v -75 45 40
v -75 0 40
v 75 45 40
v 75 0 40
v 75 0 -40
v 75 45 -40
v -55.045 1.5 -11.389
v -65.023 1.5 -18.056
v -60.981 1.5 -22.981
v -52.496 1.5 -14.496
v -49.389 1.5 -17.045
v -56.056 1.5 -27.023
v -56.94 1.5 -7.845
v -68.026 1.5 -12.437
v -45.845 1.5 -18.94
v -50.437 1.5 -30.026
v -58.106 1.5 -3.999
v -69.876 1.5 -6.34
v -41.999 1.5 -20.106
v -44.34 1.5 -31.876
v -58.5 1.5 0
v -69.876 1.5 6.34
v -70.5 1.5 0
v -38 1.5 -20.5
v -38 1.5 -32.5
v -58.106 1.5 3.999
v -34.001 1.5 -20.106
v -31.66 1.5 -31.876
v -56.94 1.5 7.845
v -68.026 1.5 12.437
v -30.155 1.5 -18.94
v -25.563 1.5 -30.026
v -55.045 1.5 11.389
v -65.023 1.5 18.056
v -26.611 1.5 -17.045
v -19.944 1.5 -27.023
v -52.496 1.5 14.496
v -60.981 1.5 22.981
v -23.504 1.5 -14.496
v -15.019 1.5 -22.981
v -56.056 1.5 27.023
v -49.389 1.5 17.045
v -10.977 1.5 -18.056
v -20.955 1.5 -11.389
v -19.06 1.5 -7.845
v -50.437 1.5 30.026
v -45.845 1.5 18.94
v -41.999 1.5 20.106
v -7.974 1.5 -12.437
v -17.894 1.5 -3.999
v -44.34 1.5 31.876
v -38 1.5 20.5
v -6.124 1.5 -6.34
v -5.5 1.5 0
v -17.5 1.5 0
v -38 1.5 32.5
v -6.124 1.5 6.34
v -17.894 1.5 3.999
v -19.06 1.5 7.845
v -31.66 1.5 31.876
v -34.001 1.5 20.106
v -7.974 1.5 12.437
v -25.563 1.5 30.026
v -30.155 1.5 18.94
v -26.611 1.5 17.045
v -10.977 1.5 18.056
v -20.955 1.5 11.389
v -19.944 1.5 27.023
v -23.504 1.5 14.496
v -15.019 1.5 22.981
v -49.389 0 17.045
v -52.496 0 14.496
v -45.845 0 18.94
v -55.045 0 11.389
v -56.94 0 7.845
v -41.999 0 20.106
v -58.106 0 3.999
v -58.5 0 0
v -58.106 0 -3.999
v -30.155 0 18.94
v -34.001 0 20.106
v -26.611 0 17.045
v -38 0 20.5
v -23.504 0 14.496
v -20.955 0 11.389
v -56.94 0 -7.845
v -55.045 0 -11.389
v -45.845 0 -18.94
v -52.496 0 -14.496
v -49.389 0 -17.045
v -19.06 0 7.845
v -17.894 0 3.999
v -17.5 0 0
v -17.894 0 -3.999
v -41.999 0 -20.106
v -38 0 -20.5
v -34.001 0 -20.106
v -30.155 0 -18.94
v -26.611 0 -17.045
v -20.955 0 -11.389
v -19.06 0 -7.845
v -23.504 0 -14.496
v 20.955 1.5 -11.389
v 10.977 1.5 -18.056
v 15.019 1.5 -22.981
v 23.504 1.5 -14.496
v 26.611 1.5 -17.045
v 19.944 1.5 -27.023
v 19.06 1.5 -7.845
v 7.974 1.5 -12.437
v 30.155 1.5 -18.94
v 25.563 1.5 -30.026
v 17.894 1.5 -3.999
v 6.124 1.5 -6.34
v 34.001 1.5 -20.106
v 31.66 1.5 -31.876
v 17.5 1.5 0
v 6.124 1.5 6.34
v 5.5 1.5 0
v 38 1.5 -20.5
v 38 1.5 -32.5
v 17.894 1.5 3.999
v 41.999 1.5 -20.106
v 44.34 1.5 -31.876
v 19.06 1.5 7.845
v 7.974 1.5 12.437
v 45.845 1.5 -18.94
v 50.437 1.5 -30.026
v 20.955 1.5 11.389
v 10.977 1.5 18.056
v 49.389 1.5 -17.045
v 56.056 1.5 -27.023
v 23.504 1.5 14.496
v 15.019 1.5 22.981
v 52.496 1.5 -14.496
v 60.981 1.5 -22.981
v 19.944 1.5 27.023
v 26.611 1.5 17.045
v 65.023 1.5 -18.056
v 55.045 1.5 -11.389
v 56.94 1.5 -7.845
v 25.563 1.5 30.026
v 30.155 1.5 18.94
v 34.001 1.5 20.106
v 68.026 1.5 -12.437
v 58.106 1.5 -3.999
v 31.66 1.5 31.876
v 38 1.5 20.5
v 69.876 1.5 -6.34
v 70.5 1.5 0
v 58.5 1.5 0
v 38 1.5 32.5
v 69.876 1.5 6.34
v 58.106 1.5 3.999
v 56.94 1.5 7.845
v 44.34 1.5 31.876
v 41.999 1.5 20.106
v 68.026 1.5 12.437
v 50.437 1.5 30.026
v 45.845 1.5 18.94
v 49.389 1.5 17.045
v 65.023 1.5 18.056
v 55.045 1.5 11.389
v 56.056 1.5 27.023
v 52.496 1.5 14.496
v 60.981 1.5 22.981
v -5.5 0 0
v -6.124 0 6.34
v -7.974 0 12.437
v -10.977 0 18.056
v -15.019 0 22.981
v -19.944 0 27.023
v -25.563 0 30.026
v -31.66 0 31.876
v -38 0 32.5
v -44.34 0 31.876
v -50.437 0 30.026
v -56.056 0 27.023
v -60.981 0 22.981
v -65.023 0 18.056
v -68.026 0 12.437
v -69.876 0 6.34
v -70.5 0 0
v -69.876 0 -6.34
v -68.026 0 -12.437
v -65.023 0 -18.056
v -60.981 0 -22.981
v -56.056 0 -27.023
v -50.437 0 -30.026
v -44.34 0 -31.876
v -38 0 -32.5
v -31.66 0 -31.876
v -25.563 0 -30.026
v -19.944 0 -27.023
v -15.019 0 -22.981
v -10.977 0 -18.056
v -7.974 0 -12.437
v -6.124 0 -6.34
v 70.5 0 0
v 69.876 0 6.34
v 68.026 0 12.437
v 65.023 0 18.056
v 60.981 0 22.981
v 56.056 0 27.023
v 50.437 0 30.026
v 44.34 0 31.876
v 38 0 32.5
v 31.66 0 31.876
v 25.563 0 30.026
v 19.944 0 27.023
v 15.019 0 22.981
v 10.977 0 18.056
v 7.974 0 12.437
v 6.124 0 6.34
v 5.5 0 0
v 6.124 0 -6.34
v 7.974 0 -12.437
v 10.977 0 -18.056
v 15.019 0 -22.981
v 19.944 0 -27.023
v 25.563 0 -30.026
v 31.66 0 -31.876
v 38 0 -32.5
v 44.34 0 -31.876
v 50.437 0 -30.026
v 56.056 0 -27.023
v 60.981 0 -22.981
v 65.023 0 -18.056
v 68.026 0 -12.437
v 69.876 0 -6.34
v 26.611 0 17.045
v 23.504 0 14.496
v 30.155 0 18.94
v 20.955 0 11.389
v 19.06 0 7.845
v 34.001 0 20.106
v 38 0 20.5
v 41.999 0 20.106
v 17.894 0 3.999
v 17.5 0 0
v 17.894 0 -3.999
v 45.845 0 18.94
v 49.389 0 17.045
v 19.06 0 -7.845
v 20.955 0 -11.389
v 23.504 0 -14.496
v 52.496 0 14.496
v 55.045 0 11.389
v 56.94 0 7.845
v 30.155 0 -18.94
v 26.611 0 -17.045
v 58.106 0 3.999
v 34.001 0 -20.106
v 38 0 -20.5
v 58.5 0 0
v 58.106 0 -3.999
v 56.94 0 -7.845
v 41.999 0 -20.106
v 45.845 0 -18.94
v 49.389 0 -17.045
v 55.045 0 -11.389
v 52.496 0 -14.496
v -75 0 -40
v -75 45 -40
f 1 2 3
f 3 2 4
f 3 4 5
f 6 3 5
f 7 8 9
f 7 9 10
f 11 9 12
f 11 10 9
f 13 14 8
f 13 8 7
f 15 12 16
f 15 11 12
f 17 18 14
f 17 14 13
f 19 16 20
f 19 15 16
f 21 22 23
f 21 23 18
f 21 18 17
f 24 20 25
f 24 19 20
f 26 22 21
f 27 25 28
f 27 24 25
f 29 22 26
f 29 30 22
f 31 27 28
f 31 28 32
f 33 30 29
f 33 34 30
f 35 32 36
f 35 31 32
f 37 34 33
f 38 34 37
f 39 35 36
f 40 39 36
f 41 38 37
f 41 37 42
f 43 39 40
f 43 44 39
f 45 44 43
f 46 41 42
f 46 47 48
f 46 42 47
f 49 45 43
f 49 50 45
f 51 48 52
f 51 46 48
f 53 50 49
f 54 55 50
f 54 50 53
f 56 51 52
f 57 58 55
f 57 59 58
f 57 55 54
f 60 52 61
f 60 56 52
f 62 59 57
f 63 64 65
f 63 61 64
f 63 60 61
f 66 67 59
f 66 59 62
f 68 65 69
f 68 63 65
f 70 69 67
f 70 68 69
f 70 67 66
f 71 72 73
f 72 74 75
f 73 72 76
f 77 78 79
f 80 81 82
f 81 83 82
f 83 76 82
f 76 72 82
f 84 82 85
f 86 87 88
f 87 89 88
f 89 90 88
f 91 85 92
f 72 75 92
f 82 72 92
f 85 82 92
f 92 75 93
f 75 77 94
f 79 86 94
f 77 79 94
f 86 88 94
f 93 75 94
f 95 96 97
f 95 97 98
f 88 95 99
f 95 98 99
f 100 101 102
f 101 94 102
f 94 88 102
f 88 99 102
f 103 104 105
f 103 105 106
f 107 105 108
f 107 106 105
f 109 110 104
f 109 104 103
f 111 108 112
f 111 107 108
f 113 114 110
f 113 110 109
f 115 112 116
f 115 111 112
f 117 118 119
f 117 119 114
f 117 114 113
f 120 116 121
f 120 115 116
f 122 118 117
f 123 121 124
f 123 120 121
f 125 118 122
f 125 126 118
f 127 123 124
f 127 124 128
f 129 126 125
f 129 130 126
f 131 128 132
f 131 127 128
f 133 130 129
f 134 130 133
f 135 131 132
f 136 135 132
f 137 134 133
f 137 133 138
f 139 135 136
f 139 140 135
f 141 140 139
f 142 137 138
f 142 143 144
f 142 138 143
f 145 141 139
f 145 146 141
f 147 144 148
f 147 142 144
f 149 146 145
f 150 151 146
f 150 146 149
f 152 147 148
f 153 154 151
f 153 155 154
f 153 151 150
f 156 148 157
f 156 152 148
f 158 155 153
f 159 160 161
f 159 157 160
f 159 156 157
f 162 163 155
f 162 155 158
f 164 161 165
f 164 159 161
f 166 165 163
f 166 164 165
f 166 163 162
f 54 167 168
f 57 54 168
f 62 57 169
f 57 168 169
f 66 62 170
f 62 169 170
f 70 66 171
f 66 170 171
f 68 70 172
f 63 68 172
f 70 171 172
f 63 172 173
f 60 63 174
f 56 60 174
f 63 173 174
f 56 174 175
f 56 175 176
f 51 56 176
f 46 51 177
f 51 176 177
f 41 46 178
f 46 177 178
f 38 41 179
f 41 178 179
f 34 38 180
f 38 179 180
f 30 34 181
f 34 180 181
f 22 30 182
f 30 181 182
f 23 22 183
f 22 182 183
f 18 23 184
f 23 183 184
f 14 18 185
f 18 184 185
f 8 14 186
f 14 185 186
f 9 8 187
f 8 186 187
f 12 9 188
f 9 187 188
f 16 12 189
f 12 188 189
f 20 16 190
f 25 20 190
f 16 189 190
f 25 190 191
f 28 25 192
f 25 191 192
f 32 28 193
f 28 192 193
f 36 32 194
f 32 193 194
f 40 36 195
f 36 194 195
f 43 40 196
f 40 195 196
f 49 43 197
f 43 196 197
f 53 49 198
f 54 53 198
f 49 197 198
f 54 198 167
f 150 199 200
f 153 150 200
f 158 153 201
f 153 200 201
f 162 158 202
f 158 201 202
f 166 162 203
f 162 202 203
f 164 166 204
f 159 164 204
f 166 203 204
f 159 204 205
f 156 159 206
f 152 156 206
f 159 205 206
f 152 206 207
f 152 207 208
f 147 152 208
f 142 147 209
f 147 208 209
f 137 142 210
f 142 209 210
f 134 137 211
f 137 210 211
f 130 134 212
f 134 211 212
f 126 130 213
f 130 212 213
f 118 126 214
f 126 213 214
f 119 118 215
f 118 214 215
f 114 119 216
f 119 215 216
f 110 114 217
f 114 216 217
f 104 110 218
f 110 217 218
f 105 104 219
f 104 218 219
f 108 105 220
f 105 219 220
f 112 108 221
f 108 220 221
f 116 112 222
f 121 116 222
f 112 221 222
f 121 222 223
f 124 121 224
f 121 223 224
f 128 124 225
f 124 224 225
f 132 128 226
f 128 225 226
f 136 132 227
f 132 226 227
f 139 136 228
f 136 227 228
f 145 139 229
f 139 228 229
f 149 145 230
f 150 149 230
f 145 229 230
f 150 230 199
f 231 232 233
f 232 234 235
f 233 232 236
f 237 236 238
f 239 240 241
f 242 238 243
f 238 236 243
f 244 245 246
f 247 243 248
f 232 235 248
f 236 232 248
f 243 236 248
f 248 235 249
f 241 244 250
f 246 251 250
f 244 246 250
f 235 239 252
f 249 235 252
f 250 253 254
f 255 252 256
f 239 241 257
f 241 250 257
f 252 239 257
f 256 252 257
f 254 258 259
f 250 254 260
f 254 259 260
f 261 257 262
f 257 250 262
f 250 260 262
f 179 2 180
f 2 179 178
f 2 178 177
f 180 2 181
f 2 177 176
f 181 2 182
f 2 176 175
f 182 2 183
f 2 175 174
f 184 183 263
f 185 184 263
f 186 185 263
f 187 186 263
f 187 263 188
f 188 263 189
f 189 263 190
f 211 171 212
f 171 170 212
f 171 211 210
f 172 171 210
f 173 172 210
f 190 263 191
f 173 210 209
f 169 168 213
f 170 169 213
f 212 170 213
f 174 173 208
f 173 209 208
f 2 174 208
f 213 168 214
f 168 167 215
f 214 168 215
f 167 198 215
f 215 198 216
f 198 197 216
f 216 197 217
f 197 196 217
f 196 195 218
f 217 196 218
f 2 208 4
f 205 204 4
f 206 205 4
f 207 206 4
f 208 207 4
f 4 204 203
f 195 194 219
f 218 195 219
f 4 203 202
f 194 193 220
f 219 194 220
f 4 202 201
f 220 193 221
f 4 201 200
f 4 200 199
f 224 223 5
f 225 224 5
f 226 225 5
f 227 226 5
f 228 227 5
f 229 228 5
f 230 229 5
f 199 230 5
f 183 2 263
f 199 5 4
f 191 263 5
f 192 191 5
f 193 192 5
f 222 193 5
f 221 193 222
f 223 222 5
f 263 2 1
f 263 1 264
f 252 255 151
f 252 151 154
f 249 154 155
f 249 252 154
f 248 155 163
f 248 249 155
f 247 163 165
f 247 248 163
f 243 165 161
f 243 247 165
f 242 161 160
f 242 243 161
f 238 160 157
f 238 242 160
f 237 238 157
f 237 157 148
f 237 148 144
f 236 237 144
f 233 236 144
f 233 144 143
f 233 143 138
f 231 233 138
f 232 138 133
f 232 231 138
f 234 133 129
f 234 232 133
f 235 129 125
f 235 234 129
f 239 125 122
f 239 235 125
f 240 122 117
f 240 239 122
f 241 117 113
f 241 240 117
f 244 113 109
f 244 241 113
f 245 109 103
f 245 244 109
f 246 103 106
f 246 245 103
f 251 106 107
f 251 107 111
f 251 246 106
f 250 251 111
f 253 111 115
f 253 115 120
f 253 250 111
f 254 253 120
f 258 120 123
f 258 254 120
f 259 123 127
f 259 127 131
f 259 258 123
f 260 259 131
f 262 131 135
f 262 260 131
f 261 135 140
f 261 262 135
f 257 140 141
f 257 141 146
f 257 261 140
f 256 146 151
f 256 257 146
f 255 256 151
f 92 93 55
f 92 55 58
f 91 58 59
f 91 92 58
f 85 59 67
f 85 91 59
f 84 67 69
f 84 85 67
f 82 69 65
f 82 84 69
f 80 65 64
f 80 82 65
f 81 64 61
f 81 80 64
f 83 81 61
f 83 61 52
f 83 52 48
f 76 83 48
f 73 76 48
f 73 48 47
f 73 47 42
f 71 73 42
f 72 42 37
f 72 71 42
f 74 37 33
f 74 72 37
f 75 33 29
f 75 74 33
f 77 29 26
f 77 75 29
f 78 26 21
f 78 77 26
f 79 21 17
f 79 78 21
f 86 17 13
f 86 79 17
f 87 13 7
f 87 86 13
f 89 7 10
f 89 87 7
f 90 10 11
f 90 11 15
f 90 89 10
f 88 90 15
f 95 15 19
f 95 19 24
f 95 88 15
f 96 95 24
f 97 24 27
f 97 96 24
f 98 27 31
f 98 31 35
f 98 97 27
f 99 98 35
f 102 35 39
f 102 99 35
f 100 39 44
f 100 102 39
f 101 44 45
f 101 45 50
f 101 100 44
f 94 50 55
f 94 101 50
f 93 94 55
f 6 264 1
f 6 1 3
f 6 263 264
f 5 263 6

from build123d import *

# Parameters (mm, degrees)
SKETCH_1_W          = 150
SKETCH_1_H          = 80
EXTRUDE_1_DEPTH     = 45
SKETCH_2_R          = 32.5
SKETCH_2_R_2        = 20.5
CUT_EXTRUDE_1_DEPTH = 1.5


with BuildPart() as part:
    # 草图1 → 凸台-拉伸1 (new body)
    with BuildSketch(Plane(origin=(0, 0, 0), x_dir=(1, 0, 0), z_dir=(0, 1, 0))):
        Rectangle(SKETCH_1_W, SKETCH_1_H)
    extrude(amount=EXTRUDE_1_DEPTH)

    # 草图2 → 切除-拉伸1 (cut)
    with BuildSketch(Plane.XZ):
        with Locations((38, 0)):
            Circle(SKETCH_2_R)
        with Locations((38, 0)):
            Circle(SKETCH_2_R_2, mode=Mode.SUBTRACT)
        with Locations((-38, 0)):
            Circle(SKETCH_2_R)
        with Locations((-38, 0)):
            Circle(SKETCH_2_R_2, mode=Mode.SUBTRACT)
    extrude(amount=-CUT_EXTRUDE_1_DEPTH, mode=Mode.SUBTRACT)


solid = part.part
